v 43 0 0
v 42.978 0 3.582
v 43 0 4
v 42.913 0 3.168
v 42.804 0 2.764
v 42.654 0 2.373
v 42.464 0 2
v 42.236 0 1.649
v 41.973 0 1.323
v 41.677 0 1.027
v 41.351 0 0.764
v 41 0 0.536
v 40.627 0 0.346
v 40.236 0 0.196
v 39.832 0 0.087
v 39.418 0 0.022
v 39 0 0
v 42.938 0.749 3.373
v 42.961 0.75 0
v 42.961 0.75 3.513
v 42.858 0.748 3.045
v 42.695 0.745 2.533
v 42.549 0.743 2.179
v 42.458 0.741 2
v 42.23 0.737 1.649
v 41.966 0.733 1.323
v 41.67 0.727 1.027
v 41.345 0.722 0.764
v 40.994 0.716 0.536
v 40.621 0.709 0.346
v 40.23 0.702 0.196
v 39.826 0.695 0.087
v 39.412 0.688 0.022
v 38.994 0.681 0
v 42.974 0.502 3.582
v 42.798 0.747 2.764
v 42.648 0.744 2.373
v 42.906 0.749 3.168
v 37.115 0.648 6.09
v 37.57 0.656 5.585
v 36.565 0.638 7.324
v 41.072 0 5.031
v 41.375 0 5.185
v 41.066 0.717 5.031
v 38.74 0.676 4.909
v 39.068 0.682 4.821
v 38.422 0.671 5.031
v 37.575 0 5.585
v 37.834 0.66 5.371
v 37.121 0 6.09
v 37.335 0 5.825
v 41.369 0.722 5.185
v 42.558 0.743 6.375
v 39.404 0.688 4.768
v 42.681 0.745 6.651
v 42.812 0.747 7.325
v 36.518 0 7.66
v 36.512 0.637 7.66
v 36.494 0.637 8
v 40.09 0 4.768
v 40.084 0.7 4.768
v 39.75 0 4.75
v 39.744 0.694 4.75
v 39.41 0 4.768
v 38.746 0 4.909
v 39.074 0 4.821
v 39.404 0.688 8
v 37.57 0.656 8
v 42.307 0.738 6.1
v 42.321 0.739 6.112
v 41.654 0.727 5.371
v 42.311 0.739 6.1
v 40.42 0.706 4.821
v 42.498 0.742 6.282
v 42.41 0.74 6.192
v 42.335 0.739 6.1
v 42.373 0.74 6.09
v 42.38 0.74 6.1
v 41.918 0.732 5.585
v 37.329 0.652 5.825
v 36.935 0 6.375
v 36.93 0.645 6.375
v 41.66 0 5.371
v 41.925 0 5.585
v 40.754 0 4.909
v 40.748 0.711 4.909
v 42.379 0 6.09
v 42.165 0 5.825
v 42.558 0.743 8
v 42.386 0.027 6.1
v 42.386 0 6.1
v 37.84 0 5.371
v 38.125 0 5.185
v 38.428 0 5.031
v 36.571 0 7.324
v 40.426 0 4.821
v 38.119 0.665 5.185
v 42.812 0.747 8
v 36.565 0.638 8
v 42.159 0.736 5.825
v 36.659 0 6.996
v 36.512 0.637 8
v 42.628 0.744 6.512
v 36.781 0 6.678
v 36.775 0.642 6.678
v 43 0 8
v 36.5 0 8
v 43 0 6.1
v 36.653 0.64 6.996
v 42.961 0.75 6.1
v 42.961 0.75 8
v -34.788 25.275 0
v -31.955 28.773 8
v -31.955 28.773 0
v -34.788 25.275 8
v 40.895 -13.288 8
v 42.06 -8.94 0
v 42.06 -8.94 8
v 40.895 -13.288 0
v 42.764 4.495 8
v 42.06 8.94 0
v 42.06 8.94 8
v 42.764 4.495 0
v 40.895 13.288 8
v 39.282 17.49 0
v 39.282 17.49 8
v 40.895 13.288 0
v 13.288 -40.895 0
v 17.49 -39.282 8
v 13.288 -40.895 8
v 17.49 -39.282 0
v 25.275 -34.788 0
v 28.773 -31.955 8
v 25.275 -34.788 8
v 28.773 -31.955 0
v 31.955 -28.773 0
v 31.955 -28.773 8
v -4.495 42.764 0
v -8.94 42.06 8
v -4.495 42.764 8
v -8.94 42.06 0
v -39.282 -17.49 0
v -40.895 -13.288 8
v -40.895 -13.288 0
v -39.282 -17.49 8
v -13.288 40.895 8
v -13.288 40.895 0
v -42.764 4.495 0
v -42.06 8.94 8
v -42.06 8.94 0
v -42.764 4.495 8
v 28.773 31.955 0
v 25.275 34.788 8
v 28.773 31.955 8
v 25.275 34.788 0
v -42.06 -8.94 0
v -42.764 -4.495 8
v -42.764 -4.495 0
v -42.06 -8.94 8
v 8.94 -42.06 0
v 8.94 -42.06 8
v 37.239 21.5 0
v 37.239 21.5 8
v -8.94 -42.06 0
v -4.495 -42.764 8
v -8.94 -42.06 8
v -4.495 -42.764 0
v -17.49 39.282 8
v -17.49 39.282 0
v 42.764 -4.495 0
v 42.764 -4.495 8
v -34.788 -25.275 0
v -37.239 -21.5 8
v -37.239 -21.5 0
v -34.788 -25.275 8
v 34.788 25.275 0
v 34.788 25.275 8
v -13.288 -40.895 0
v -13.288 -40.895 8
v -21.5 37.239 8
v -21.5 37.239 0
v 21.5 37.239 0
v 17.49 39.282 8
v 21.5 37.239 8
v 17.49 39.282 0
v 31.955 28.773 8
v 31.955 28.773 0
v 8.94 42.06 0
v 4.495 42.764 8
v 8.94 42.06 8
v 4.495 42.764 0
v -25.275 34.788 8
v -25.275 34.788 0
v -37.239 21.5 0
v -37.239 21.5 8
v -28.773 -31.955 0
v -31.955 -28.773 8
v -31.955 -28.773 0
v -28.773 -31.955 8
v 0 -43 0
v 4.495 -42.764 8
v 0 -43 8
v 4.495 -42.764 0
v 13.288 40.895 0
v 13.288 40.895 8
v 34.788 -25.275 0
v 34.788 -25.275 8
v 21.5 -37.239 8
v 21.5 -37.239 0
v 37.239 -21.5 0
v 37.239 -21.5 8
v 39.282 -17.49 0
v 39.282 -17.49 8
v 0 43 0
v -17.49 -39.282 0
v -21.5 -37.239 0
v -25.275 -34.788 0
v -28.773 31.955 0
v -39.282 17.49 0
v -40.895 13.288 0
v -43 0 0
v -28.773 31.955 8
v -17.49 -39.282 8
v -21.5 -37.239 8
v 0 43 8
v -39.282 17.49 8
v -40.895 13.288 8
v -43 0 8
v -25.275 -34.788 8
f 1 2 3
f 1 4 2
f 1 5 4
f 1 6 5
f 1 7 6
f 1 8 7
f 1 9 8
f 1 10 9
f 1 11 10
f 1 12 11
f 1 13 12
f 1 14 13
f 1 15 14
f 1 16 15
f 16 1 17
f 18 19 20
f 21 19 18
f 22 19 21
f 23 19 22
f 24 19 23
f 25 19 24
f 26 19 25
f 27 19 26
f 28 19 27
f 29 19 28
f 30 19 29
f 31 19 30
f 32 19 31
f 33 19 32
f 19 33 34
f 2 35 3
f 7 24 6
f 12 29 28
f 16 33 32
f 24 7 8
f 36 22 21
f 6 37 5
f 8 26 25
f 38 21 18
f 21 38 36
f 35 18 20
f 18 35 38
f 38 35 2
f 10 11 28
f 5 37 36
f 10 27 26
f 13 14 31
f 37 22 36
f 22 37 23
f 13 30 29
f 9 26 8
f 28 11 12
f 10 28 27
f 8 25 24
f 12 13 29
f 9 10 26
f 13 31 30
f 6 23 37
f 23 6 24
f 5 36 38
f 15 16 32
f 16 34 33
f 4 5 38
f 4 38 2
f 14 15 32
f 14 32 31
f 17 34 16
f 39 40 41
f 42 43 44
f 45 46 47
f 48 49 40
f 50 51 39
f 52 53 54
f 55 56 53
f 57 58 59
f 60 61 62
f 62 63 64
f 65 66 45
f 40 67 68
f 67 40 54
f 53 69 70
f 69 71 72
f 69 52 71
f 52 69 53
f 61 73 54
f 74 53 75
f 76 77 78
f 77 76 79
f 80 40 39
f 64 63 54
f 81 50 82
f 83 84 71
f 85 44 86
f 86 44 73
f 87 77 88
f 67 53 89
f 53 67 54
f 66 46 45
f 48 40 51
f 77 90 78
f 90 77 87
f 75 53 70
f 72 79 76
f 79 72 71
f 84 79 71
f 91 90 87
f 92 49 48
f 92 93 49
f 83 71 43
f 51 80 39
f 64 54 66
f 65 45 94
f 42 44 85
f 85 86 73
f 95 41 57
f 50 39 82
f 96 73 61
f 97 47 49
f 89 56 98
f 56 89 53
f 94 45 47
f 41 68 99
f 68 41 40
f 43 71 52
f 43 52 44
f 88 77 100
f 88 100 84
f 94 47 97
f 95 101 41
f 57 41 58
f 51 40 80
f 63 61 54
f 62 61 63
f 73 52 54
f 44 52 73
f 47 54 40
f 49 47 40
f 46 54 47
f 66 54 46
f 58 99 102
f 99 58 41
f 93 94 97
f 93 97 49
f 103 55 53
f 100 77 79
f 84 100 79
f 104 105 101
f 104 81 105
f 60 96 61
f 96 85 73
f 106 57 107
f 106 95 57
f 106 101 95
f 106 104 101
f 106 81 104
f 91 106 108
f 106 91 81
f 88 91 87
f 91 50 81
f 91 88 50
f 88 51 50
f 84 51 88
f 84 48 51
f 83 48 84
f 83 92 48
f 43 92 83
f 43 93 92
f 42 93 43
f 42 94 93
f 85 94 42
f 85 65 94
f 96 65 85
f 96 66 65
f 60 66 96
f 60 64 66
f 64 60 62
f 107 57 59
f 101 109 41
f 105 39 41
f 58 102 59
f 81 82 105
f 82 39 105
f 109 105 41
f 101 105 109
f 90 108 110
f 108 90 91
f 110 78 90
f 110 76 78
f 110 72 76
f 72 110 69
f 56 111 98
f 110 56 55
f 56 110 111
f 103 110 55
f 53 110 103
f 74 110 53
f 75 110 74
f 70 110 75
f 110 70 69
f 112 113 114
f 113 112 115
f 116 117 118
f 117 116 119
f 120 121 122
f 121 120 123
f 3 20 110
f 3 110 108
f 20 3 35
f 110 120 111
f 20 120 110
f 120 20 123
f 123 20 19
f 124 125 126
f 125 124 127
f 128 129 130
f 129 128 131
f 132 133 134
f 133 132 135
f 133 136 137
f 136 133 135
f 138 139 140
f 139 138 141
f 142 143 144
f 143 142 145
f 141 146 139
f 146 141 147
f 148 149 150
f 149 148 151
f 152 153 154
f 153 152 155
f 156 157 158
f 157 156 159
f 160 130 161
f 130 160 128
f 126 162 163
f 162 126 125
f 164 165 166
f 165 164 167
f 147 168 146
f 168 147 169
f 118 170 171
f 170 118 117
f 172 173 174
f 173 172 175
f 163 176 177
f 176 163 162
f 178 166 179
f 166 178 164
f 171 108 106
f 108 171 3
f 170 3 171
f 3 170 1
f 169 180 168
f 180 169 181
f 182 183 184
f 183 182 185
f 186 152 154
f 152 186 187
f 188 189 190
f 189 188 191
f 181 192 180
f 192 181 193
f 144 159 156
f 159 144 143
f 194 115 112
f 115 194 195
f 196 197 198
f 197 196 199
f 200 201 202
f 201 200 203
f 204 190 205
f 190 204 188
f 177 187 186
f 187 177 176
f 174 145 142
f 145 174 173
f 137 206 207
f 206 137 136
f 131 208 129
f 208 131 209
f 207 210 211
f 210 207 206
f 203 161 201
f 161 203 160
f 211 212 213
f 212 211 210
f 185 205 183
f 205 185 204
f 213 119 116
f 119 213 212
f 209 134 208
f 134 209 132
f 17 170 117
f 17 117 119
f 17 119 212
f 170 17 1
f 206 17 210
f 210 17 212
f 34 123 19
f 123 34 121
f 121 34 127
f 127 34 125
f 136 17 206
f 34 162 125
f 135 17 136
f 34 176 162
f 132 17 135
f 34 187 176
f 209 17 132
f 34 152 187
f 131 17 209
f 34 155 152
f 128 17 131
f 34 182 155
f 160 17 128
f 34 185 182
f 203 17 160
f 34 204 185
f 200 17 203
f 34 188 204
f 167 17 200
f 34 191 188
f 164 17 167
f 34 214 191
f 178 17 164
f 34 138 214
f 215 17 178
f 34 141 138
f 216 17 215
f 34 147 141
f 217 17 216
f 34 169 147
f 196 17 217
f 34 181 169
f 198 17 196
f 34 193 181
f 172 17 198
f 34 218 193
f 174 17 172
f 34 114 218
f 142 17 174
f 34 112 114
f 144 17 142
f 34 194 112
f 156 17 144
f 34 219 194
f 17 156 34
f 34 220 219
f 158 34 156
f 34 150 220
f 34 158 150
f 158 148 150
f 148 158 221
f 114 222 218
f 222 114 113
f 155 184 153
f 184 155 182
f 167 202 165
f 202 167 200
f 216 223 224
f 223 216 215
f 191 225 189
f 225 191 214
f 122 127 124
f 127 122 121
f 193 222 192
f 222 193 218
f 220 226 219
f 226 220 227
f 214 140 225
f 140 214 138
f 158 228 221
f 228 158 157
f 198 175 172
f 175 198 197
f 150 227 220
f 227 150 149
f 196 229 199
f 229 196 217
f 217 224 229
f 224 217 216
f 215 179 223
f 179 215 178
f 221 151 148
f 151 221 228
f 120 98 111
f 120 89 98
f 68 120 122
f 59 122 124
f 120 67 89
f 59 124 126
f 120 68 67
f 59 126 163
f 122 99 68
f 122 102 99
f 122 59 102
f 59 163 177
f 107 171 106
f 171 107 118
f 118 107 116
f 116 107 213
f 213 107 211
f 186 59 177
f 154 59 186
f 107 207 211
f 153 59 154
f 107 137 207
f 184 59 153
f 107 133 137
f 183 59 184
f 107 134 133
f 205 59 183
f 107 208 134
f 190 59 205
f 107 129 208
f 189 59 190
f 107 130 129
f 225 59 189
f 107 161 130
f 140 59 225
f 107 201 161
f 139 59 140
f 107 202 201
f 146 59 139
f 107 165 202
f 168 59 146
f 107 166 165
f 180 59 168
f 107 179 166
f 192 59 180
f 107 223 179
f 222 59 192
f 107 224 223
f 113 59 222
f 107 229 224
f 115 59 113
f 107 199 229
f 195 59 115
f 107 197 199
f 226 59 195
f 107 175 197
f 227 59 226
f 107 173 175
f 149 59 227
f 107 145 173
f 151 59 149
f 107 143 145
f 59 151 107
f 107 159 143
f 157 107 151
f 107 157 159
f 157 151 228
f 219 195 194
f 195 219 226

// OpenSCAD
lid_diameter = 86;
wall_thickness = 6.5;
thickness = 8;
rounding = 4;

/* [Hidden] */

top_diameter = lid_diameter;
inner_diameter = top_diameter-wall_thickness*2;
indent_diameter = (top_diameter-inner_diameter)/2;

module ci(diameter, thickness) {
    scale([1,1,thickness]) {
        translate([0,0,0.5]) {
            cylinder(d=diameter, $fn=60, center=true);
        }
    }
}

difference() {
    union() {
        ci(top_diameter, thickness);
    };
    translate([0,0,thickness]) {
        rotate_extrude(angle=1, $fn=60) {
            translate([(top_diameter-indent_diameter)/2,0,0]) {
                circle(d=indent_diameter);
            }
        };
        translate([0,0,-1.9]) {
            rotate_extrude(angle=1, $fn=60) {
                translate([(top_diameter)/2-indent_diameter+1,0,0]) {
                    square(20,0);
                }
            }
        };
        translate([0,0,-10+rounding-thickness]) {
            difference() {
            rotate_extrude(angle=1, $fn=60) {
                translate([top_diameter/2-rounding,0,0]) {
                    square(10,0);
                }
            }
            translate([0,0,10])
            rotate_extrude(angle=1, $fn=60) {
                translate([top_diameter/2-rounding,0,0]) {
                    circle(d=rounding*2, $fn=60);
                }
            }
            }
        }
    }
}
